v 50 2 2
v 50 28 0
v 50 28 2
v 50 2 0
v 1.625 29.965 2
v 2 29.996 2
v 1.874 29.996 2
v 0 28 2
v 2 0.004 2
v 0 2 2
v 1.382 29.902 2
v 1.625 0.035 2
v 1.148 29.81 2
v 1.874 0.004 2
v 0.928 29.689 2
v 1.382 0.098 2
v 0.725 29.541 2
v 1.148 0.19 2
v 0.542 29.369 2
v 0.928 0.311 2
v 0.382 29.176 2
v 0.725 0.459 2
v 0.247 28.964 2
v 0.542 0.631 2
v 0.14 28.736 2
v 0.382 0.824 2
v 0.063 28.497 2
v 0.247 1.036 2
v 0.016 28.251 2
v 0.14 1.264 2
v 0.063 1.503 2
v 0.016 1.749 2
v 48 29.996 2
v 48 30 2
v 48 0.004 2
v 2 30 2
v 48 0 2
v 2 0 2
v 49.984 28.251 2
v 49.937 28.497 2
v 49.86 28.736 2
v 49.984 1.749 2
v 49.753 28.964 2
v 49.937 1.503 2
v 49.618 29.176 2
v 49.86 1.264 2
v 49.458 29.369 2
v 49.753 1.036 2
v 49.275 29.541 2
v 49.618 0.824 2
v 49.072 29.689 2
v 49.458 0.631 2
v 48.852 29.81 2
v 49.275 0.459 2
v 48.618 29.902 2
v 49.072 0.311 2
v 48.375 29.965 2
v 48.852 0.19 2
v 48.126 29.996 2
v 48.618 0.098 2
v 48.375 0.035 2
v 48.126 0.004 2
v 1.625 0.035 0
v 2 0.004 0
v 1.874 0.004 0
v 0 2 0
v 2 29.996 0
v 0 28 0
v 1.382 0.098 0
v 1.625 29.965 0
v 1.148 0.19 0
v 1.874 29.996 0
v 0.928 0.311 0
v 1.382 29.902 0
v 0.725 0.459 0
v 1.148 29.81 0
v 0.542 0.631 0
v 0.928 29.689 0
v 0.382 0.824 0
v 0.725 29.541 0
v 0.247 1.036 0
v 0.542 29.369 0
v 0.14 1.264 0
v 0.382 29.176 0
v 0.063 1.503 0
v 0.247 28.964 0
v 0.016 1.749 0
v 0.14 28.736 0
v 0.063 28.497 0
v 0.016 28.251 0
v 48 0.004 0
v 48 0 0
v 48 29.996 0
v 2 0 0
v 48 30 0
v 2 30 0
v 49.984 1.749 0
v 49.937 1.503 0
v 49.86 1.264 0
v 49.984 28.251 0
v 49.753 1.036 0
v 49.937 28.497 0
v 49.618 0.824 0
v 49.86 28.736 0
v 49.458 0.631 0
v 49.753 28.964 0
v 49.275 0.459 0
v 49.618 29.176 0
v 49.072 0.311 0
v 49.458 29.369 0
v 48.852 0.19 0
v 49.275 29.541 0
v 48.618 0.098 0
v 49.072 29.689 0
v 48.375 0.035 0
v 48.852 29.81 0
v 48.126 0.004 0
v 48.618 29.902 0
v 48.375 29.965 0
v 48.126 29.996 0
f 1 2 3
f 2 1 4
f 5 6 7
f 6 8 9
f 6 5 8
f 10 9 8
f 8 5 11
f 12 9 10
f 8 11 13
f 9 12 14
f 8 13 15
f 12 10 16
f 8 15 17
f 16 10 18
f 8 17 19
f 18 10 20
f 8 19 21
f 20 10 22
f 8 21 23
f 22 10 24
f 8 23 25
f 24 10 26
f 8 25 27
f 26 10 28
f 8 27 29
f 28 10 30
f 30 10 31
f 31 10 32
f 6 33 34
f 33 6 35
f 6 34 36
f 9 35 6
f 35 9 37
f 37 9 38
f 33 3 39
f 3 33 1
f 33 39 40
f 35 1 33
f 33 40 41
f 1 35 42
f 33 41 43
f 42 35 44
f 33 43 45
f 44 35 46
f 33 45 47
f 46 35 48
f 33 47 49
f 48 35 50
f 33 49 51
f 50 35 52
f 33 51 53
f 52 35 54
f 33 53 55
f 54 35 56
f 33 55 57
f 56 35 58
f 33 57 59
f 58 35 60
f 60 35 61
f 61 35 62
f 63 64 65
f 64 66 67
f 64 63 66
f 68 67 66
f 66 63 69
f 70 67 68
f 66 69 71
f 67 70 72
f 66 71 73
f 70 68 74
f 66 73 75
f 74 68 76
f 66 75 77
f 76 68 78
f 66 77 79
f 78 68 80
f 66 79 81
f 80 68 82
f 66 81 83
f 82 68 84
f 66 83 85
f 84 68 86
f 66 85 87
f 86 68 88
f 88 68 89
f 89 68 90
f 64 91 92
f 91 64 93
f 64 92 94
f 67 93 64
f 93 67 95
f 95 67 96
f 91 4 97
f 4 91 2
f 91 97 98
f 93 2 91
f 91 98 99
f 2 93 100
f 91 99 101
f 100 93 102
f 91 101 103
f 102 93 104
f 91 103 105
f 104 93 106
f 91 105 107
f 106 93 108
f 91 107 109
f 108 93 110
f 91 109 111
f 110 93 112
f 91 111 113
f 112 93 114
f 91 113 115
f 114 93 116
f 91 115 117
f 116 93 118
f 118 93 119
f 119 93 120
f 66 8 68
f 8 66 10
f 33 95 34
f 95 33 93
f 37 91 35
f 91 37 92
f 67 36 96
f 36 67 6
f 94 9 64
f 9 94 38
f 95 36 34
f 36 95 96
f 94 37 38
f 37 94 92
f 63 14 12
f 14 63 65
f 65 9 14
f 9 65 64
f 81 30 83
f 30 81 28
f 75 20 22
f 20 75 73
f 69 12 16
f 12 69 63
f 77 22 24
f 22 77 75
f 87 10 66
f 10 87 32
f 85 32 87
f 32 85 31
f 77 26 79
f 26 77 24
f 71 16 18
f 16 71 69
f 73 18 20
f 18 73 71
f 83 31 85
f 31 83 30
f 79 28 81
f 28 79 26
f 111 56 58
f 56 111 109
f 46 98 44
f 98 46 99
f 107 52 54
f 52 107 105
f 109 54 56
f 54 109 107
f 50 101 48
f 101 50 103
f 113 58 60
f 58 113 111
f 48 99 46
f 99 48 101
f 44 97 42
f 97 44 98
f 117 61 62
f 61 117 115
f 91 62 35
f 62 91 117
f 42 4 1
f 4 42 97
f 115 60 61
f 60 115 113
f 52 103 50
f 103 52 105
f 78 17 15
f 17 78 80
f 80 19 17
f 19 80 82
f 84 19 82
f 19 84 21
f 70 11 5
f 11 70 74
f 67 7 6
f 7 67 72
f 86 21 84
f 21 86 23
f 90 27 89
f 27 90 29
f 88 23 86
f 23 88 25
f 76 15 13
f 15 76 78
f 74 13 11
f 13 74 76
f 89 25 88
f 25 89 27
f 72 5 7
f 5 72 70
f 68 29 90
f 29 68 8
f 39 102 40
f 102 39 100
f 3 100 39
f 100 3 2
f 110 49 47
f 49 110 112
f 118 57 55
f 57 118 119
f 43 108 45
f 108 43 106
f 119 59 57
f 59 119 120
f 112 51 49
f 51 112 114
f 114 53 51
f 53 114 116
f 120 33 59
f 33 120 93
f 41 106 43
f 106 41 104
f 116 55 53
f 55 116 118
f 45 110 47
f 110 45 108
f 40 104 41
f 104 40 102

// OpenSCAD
// parameters
X = 50;
Y = 30;
THICKNESS = 2;
R = 2;
RESOLUTION = 50;

module RoundedRectangle(x, y, thickness, r, $fn=0) {

    translate([0, r, 0])
        cube([x, y-2*r, thickness]);
    translate([r, 0, 0])
        cube([x-2*r, y, thickness]);

    translate([r, r, 0])
        cylinder(r=r, h=thickness, $fn=$fn);
    translate([x-r, r, 0])
        cylinder(r=r, h=thickness, $fn=$fn);
    translate([r, y-r, 0])
        cylinder(r=r, h=thickness, $fn=$fn);
    translate([x-r, y-r, 0])
        cylinder(r=r, h=thickness, $fn=$fn);

}

// main
RoundedRectangle(x=X, y=Y, thickness=THICKNESS, r=R, $fn=RESOLUTION);
